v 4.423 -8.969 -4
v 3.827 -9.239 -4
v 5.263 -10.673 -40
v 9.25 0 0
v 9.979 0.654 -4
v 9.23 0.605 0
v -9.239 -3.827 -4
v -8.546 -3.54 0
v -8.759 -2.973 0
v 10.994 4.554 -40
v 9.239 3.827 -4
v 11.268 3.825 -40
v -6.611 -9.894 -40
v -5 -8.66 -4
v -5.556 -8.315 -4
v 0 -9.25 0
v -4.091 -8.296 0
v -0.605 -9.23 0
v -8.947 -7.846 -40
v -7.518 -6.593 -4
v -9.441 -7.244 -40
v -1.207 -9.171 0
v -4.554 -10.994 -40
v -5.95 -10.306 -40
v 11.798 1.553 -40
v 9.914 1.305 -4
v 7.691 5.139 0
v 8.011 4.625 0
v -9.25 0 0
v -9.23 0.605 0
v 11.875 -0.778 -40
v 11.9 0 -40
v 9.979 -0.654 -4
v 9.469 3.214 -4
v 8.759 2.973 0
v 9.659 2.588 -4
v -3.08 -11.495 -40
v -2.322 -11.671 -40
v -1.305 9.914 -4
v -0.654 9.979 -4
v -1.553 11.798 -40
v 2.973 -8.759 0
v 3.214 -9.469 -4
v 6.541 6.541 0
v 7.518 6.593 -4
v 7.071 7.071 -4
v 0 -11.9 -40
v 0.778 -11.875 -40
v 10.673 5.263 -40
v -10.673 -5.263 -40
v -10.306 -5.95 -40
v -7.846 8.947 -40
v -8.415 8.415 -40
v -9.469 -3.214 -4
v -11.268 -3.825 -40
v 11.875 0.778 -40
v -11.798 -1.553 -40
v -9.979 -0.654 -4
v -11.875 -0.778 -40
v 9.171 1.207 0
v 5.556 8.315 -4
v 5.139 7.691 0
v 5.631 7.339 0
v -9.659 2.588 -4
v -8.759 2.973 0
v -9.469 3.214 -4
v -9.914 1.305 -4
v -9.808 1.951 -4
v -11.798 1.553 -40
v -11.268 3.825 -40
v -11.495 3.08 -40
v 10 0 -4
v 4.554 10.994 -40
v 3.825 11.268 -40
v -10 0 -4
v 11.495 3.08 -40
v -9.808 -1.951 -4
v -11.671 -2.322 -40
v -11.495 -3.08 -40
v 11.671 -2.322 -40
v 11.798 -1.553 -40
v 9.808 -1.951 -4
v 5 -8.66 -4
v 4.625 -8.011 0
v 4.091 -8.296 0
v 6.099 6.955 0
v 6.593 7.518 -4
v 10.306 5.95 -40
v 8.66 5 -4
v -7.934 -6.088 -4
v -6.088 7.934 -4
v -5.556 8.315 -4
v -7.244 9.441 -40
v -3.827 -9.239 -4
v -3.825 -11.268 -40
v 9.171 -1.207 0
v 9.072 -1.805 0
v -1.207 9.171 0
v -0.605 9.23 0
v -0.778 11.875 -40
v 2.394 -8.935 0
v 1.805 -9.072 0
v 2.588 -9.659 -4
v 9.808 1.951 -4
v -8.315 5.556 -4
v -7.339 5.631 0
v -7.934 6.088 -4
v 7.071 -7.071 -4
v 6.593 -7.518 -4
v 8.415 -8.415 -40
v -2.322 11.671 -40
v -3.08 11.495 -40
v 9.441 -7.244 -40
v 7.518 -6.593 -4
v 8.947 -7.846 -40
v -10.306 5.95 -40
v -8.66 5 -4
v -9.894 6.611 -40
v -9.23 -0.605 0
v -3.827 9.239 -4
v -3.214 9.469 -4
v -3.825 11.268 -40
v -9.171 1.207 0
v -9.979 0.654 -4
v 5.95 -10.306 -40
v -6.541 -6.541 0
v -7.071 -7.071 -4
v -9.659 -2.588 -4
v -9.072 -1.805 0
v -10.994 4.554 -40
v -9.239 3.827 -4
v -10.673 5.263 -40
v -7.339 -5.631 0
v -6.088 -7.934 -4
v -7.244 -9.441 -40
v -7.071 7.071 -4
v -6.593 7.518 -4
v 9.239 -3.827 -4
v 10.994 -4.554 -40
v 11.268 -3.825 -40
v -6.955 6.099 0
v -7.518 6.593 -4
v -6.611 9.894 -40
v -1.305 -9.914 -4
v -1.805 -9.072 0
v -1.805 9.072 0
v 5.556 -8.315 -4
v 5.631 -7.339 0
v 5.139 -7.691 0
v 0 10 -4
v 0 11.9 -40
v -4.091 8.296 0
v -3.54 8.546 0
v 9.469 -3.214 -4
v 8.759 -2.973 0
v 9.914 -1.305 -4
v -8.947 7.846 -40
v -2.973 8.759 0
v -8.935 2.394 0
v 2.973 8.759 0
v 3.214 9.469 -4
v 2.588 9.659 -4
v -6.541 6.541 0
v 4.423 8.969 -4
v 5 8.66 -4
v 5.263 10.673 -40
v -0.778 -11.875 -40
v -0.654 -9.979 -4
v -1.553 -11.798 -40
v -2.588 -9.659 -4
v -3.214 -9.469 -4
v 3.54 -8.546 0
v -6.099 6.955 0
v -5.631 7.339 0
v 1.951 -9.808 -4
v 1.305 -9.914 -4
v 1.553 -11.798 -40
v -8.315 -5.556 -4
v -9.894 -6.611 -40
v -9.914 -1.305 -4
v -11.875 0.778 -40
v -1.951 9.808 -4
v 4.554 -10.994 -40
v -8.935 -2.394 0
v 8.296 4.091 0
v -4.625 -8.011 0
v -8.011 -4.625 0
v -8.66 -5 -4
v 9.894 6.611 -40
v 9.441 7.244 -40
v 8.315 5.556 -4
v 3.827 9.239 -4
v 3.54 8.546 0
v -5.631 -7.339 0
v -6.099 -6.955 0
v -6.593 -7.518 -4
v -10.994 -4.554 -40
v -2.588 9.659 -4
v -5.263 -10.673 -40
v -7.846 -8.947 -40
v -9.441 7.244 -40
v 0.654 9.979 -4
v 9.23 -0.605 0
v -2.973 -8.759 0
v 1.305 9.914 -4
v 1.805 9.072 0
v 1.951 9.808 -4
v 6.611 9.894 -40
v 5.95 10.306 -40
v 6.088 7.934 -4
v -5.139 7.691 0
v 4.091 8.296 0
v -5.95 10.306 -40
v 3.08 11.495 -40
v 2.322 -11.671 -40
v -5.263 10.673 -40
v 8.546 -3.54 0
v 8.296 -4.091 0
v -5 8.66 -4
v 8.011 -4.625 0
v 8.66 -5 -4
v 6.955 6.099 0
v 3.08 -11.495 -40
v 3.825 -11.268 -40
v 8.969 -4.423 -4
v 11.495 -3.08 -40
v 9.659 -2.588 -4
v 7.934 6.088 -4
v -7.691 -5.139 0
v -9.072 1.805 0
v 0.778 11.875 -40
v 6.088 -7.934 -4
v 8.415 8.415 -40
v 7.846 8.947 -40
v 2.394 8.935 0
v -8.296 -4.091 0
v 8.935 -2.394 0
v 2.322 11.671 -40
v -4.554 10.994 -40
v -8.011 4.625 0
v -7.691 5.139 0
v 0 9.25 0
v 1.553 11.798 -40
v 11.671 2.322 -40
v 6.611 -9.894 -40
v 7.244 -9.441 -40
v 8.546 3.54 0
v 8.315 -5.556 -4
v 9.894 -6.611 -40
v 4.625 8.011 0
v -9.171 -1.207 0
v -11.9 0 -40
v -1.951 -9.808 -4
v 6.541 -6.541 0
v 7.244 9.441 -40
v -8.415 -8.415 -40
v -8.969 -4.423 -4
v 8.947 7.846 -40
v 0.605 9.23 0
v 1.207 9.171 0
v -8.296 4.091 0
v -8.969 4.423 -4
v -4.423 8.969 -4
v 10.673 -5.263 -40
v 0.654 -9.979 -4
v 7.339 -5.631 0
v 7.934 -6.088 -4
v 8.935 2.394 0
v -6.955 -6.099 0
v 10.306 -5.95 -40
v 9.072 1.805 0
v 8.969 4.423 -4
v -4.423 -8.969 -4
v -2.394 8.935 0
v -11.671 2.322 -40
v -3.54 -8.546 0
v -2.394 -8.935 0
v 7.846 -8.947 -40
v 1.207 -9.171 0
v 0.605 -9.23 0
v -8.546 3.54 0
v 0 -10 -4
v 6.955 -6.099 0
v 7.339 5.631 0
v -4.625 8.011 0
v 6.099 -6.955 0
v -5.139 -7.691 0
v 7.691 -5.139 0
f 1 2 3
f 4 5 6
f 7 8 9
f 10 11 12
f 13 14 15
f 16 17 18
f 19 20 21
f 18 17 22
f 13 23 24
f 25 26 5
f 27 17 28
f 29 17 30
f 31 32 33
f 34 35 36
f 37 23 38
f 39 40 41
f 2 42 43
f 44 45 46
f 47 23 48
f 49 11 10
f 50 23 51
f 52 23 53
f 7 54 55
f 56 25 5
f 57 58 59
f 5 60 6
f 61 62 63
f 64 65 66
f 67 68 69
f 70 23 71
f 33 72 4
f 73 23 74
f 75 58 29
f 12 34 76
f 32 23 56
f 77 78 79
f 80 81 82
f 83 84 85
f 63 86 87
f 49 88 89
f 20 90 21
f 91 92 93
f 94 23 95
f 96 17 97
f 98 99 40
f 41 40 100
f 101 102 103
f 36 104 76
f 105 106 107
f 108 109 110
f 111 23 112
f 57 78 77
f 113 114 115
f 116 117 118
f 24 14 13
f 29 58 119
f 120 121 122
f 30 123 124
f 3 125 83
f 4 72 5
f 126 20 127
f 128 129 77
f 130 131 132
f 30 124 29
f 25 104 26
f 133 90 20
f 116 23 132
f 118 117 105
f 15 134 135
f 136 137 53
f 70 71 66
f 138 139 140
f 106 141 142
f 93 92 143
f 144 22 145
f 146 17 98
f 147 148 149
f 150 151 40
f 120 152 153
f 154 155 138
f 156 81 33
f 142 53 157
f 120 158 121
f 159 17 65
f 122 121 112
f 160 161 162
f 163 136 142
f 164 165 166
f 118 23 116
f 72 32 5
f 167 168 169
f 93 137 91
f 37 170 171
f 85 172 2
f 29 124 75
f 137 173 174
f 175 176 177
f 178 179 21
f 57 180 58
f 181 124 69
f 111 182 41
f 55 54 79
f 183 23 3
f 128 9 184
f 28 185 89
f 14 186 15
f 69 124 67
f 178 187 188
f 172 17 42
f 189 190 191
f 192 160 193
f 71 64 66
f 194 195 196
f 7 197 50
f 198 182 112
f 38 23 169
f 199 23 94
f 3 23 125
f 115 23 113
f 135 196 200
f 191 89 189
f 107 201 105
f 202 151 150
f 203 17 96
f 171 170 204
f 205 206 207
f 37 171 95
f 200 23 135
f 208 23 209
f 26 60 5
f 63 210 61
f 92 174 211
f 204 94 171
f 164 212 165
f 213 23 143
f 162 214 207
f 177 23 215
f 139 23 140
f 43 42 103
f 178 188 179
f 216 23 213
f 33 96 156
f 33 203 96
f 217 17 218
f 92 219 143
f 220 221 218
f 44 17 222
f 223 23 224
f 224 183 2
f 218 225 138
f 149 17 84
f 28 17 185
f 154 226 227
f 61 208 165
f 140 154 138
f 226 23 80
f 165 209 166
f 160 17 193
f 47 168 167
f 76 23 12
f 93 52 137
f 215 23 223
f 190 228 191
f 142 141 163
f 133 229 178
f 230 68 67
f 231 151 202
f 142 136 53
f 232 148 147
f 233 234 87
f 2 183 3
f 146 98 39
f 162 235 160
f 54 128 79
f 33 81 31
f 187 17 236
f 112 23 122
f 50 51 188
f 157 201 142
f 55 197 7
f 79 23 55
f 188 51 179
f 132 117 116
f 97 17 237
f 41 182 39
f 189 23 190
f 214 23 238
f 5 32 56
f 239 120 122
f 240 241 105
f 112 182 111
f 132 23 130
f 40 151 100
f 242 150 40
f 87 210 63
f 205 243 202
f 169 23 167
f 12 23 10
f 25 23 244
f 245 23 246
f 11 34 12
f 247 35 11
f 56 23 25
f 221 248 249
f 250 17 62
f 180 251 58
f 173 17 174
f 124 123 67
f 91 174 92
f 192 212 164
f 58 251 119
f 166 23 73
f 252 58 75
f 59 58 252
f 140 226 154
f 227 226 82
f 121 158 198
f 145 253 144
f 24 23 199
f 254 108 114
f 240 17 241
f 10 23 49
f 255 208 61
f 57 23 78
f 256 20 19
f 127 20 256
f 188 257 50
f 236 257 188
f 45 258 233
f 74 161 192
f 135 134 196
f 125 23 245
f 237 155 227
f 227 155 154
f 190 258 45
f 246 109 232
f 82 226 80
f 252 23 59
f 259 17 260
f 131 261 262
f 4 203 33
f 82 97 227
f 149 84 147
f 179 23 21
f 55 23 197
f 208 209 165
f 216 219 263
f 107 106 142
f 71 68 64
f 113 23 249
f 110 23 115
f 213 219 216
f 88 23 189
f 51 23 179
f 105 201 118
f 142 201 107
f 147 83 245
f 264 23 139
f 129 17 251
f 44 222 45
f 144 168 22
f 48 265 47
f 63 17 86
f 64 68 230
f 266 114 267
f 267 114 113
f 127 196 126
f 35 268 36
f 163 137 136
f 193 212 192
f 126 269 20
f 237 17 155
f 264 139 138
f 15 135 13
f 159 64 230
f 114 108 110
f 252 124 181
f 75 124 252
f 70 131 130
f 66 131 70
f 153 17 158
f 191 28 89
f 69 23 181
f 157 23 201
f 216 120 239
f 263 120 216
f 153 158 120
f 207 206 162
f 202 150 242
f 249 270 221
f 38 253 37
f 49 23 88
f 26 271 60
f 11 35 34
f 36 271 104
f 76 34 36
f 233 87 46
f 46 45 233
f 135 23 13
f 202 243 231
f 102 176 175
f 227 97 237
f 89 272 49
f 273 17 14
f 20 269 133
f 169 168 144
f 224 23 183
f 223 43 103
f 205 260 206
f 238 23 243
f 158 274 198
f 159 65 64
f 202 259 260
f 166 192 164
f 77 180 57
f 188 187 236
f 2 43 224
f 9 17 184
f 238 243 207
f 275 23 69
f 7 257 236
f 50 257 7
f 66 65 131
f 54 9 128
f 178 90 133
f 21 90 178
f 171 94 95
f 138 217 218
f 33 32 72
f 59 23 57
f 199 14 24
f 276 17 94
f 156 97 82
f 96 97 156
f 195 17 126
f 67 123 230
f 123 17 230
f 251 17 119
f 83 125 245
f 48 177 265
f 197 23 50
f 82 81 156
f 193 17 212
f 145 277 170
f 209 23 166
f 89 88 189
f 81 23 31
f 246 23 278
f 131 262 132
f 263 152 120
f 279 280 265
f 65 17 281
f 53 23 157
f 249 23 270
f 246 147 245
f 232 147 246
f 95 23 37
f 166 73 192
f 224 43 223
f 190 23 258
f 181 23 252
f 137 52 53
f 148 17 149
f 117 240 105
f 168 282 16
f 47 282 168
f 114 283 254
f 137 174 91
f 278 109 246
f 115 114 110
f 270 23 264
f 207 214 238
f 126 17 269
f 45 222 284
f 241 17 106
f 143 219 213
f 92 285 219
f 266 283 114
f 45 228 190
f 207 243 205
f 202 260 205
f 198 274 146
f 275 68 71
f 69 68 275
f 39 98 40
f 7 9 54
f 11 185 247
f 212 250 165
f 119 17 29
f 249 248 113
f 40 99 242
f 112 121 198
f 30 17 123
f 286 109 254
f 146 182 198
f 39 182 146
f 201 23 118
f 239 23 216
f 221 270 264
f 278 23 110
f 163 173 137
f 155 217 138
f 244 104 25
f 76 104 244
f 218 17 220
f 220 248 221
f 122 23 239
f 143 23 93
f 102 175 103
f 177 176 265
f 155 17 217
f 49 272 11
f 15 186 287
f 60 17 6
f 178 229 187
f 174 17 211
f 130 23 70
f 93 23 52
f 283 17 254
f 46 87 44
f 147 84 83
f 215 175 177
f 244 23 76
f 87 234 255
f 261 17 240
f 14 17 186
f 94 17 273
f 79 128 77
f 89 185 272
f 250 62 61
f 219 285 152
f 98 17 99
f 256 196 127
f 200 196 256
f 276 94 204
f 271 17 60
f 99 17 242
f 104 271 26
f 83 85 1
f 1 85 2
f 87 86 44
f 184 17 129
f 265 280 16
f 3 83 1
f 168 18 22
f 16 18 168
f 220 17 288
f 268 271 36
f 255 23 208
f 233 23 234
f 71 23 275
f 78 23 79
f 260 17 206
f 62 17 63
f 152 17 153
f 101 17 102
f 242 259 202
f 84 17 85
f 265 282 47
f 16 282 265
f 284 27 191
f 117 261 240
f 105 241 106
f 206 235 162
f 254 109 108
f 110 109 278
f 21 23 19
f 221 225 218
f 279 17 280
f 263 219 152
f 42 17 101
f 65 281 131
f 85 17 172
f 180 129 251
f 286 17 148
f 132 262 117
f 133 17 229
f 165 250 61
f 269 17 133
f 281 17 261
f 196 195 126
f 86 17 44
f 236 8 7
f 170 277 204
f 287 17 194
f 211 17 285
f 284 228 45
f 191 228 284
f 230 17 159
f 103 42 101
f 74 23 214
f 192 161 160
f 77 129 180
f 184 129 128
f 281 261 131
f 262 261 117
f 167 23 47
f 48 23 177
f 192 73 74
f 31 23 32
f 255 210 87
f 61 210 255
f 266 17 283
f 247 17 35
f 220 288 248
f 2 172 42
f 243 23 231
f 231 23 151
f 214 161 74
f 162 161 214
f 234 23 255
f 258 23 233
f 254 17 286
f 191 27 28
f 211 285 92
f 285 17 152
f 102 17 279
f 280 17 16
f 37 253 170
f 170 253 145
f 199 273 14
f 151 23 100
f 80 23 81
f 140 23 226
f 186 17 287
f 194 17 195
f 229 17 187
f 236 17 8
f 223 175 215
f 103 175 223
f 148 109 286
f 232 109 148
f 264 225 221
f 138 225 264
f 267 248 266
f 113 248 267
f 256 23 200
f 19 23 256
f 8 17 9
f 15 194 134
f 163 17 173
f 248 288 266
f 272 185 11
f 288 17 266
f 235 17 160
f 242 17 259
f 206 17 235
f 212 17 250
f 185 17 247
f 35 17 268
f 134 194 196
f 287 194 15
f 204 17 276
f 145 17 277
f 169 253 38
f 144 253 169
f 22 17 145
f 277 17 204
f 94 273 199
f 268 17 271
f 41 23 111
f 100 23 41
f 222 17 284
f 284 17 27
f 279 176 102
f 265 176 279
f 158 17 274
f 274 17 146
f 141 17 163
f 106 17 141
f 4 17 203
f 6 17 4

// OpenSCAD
hull() {
									multmatrix([[1, 0, 0, 0], [0, 1, 0, 0], [0, 0, 1, -1], [0, 0, 0, 1]]) {
										cylinder($fn = 96, $fa = 12, $fs = 2, h = 2, r1 = 9.25, r2 = 9.25, center = true);
									}
									multmatrix([[1, 0, 0, 0], [0, 1, 0, 0], [0, 0, 1, -22], [0, 0, 0, 1]]) {
										cylinder($fn = 96, $fa = 12, $fs = 2, h = 36, r1 = 11.9, r2 = 10, center = true);
									}
                                }
